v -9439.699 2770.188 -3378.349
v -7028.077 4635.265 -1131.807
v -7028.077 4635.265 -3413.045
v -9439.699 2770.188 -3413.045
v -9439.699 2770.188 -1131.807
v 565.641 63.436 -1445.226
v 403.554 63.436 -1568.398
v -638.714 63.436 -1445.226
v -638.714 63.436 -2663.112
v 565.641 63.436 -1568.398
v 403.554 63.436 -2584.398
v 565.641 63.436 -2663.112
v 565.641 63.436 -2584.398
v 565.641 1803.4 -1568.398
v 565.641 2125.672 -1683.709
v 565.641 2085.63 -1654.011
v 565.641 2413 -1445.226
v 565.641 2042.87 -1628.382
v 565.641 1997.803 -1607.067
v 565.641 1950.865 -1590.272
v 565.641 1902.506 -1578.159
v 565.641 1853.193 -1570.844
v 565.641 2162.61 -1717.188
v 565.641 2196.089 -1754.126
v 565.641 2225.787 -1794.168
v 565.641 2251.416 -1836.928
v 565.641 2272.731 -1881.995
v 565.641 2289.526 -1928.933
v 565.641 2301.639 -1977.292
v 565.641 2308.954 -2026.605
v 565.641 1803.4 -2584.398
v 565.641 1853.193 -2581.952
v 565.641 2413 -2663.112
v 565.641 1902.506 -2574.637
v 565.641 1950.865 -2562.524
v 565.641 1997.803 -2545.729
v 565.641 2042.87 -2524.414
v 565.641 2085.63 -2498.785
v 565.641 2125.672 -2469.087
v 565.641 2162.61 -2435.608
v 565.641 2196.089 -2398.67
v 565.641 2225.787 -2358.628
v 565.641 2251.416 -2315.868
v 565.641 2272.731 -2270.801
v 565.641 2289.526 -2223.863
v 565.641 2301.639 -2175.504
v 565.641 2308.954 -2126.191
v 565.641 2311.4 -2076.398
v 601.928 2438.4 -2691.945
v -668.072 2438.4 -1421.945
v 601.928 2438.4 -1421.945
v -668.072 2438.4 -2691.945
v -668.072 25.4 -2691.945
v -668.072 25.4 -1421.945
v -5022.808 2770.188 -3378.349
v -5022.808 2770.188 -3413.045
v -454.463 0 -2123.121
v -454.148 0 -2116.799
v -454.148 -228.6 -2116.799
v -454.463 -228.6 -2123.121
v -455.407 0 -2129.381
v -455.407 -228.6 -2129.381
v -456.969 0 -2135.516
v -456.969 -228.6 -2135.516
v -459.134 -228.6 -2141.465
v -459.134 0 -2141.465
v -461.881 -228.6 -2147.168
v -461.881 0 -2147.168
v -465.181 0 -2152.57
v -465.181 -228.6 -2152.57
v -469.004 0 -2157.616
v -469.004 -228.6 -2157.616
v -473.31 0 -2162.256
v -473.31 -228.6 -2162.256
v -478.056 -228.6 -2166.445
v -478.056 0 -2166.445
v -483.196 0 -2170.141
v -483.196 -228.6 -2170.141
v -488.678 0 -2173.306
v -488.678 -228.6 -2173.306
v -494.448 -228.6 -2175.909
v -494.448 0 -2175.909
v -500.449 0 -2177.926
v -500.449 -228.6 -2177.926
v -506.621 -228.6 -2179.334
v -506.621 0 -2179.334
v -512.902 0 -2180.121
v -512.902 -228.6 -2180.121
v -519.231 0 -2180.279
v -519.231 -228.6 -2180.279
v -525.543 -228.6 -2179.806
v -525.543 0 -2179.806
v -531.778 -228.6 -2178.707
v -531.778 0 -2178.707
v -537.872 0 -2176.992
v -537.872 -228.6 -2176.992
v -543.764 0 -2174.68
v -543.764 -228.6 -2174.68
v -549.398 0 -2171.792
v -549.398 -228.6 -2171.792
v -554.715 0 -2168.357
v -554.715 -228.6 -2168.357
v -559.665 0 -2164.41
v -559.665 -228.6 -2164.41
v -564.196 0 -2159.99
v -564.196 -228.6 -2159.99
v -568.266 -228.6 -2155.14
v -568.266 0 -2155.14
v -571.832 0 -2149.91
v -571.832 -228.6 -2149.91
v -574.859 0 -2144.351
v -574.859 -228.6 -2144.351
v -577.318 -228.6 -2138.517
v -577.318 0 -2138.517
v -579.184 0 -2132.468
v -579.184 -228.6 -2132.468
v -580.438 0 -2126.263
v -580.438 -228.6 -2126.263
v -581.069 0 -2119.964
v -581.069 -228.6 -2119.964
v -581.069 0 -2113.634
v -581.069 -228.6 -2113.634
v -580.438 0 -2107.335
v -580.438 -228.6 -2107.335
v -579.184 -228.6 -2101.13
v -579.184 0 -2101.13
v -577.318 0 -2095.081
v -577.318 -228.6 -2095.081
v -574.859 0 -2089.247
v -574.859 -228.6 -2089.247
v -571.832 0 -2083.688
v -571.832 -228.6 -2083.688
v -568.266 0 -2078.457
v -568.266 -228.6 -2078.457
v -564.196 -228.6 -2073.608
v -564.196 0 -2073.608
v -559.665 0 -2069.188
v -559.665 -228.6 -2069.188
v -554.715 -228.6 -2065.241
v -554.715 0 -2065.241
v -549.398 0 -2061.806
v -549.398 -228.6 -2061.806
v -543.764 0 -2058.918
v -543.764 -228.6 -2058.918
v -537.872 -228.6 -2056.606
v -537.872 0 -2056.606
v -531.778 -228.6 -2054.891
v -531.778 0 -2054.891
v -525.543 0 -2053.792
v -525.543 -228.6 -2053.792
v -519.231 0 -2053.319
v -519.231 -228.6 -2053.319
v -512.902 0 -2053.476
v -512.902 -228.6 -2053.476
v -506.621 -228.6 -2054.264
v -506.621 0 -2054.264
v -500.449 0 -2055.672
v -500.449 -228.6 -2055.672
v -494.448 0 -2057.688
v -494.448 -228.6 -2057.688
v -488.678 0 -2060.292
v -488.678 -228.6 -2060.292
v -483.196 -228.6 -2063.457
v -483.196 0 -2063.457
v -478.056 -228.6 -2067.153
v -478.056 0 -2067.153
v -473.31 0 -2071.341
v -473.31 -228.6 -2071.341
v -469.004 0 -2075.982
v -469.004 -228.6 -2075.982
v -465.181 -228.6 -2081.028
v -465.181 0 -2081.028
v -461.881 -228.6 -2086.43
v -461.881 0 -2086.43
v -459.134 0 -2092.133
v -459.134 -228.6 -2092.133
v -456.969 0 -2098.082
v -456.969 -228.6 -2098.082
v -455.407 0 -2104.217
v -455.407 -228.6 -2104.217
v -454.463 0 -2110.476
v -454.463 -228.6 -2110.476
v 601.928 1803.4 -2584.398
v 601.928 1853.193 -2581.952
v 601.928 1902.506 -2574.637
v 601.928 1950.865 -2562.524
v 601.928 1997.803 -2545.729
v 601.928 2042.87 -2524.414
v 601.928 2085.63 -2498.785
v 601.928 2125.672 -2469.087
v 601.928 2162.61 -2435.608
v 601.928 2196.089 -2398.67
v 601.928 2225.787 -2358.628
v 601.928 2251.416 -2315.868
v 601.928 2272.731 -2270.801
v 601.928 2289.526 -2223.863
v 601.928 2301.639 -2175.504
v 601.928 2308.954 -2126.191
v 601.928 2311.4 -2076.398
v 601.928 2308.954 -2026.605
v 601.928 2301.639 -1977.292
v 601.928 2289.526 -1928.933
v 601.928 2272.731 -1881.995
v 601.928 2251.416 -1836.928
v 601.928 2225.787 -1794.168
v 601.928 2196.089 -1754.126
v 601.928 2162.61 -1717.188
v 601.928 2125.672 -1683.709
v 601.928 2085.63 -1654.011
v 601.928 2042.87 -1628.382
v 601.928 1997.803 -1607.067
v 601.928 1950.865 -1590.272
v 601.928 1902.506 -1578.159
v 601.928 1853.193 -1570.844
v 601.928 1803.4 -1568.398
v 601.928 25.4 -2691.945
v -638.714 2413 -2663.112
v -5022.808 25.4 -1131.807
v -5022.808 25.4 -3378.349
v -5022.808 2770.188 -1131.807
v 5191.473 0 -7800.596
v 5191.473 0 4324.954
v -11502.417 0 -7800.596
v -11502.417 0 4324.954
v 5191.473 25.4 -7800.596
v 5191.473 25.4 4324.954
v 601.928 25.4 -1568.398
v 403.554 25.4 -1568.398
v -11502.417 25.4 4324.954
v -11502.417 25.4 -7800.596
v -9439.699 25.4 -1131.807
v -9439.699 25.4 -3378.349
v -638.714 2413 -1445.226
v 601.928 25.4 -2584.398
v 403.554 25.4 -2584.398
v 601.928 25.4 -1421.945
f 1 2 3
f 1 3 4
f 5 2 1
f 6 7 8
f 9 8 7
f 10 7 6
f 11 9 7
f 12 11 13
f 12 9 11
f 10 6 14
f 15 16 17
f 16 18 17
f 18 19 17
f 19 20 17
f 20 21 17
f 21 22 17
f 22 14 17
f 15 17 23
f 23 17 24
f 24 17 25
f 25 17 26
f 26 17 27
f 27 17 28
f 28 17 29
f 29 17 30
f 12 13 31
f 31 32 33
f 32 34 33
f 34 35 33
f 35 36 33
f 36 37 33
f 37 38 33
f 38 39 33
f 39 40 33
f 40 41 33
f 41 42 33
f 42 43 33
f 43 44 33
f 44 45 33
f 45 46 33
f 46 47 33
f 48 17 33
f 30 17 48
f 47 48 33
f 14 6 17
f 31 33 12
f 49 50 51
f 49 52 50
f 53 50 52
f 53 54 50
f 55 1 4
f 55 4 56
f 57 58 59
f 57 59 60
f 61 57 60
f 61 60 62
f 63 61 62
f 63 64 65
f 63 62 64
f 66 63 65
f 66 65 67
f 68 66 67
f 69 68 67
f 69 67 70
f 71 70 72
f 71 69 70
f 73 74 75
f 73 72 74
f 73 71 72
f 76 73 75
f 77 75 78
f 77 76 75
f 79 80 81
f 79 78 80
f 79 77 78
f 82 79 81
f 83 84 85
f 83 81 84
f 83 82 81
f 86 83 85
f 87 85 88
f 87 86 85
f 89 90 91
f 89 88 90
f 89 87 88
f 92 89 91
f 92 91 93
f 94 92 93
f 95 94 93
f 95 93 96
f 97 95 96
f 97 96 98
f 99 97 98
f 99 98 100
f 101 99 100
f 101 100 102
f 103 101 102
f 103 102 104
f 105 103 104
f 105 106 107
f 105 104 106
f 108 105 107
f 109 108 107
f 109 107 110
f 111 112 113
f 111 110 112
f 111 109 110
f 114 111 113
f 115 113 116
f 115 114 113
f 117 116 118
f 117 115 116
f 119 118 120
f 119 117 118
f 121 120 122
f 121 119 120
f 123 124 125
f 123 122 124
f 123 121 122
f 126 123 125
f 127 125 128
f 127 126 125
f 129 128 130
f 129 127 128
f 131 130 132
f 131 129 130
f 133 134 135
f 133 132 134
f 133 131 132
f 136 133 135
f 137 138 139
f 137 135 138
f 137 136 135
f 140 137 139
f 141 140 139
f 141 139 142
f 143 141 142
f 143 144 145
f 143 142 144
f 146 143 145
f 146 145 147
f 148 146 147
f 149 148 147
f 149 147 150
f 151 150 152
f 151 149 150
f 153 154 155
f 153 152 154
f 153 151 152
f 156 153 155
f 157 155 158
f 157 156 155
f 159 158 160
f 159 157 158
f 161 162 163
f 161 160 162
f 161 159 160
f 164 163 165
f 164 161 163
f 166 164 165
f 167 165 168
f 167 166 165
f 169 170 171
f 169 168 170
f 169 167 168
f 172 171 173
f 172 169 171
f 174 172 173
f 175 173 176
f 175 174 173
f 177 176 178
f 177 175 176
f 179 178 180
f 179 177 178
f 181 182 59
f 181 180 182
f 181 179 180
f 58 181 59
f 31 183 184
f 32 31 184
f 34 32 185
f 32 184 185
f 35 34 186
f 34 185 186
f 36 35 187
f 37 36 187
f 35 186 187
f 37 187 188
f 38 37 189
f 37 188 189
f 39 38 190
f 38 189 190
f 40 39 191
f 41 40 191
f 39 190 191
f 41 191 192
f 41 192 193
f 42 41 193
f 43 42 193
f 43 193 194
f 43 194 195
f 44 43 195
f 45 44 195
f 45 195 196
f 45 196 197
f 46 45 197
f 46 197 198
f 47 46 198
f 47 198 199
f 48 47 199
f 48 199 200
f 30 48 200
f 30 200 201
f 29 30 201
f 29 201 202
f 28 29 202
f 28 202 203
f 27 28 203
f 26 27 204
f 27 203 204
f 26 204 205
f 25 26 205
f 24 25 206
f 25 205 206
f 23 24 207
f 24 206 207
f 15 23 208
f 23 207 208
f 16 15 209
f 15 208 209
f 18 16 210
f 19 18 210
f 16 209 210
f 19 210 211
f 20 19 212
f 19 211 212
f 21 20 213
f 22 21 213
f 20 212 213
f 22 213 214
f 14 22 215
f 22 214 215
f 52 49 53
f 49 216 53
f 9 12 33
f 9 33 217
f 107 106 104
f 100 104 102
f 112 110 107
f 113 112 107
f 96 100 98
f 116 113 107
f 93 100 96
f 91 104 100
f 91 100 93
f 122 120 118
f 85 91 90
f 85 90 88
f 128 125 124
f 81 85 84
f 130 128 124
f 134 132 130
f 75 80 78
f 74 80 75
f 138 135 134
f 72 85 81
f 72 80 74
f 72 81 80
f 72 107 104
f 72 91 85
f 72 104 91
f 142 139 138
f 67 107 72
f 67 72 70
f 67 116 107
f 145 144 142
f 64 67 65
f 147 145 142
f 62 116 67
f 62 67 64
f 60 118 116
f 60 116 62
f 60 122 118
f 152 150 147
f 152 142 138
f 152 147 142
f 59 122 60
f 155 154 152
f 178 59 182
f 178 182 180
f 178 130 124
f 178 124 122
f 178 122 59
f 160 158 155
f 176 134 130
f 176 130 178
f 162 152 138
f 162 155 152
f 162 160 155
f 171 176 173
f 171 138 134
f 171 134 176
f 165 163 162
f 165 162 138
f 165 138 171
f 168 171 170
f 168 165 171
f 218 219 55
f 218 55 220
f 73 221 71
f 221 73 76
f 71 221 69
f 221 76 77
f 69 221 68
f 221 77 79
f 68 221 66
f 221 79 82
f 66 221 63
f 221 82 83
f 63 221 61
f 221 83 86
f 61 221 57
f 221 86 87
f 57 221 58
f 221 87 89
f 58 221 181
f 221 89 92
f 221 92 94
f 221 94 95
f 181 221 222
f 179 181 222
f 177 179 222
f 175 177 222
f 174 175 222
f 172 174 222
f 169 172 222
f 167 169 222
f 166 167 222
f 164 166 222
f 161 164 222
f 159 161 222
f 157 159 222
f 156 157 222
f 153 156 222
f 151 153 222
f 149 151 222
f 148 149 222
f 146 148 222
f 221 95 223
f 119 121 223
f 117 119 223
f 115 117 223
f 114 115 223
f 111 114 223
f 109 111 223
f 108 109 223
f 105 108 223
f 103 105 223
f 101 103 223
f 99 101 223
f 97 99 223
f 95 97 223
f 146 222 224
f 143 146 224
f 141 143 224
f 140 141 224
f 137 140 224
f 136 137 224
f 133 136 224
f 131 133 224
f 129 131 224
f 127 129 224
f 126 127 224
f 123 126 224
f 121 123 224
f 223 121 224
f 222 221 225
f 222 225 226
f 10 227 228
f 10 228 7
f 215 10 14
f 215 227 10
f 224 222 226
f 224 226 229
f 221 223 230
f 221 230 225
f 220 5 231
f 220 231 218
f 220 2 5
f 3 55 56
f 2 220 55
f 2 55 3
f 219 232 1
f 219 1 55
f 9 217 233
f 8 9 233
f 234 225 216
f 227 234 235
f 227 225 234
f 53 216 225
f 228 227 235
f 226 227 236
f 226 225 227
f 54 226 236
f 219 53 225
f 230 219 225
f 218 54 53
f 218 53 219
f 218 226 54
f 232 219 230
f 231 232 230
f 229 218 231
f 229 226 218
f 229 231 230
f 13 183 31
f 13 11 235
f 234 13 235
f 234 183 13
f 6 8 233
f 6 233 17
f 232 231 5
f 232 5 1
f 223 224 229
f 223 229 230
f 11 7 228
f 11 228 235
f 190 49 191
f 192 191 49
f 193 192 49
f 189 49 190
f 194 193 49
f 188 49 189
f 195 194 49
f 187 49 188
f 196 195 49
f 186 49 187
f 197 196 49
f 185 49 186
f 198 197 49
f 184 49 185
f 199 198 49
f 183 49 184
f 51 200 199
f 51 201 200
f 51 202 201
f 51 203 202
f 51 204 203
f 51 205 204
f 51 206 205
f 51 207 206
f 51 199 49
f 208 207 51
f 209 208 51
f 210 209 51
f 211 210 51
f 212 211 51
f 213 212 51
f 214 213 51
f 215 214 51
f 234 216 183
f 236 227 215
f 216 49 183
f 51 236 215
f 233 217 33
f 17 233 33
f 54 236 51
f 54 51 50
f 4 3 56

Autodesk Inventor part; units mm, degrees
ref_plane "YZ Plane" through (0, 0, 0) normal (1, 0, 0) x (0, 1, 0)
ref_plane "XZ Plane" through (0, 0, 0) normal (0, 1, 0) x (-1, 0, 0)
ref_plane "XY Plane" through (0, 0, 0) normal (0, 0, 1) x (1, 0, 0)
sketch "Sketch1" plane through (0, 0, 0) normal (0, 1, 0) x (-1, 0, 0)
  line L0 (-5191.4732, 4324.9541) -> (11502.4171, 4324.9541)
  line L1 (11502.4171, 4324.9541) -> (11502.4171, -7800.5964)
  line L2 (11502.4171, -7800.5964) -> (-5191.4732, -7800.5964)
  line L3 (-5191.4732, -7800.5964) -> (-5191.4732, 4324.9541)
extrude "Extrusion1" add sketch "Sketch1" along normal blind 25.4
sketch "Sketch2" plane through (0, 0, 0) normal (0, -1, 0) x (1, 0, 0)
  circle A0 centre (-517.6476, -2116.7989) radius 63.5
  point P0 (0, 0)
  dimension "d2" = 127
extrude "Extrusion2" add sketch "Sketch2" along normal blind 228.6
sketch "Sketch3" plane through (0, 0, 0) normal (0, -1, 0) x (1, 0, 0)
  line L0 (-668.0718, -1421.9447) -> (601.9282, -1421.9447)
  line L1 (601.9282, -1421.9447) -> (601.9282, -2691.9447)
  line L2 (601.9282, -2691.9447) -> (-668.0718, -2691.9447)
  line L3 (-668.0718, -2691.9447) -> (-668.0718, -1421.9447)
  point P0 (0, 0)
  dimension "d5" = 1270
  dimension "d6" = 1270
extrude "Extrusion3" add sketch "Sketch3" against normal blind 2413
sketch "Sketch4" plane through (601.9282, 25.4, -2691.9447) normal (1, 0, 0) x (0, 0, -1)
  point P0 (-2691.9447, -25.4)
sketch "Sketch5" plane through (601.9282, 25.4, -2691.9447) normal (1, 0, 0) x (0, 0, -1)
  line L0 (-7016.8988, 0) -> (5108.6517, 0) projected
  line L1 (-107.5467, 0) -> (-1123.5467, 0)
  line L2 (-1123.5467, 0) -> (-1123.5467, 1778)
  line L3 (-107.5467, 1778) -> (-107.5467, 0)
  arc A0 (-107.5467, 1778) -> (-1123.5467, 1778) centre (-615.5467, 1778) ccw
  line L4 (-1123.5467, 0) -> (-107.5467, 0)
  point P0 (-2691.9447, -25.4)
extrude "Extrusion4" cut sketch "Sketch5" against normal blind 198.374
sketch "Sketch7" plane through (0, 2413, 0) normal (0, 1, 0) x (1, 0, 0)
  line L0 (-638.7139, 1445.2256) -> (565.6407, 1445.2256)
  line L1 (565.6407, 1445.2256) -> (565.6407, 2663.1123)
  line L2 (565.6407, 2663.1123) -> (-638.7139, 2663.1123)
  line L3 (-638.7139, 2663.1123) -> (-638.7139, 1445.2256)
  point P0 (0, 0)
extrude "Extrusion5" cut sketch "Sketch7" against normal blind 2349.5635
sketch "Sketch8" plane through (0, 2413, 0) normal (0, 1, 0) x (1, 0, 0)
  line L0 (601.9282, 2691.9447) -> (-668.0718, 2691.9447) projected
  line L1 (601.9282, 1568.398) -> (601.9282, 1421.9447) projected
  line L2 (-668.0718, 2691.9447) -> (601.9282, 2691.9447)
  line L3 (601.9282, 2691.9447) -> (601.9282, 1421.9447)
  line L4 (601.9282, 1421.9447) -> (-668.0718, 1421.9447)
  line L5 (-668.0718, 1421.9447) -> (-668.0718, 2691.9447)
  point P0 (0, 0)
extrude "Extrusion6" add sketch "Sketch8" along normal blind 25.4
sketch "Sketch9" plane through (-11502.4171, 0, -7800.5964) normal (-1, 0, 0) x (0, 0, 1)
  point P0 (7800.5964, 0)
sketch "Sketch10" plane through (0, 25.4, 0) normal (0, 1, 0) x (1, 0, 0)
  line L0 (-5022.8081, 1131.8072) -> (-9439.699, 1131.8072)
  line L1 (-9439.699, 1131.8072) -> (-9439.699, 3378.3486)
  line L2 (-9439.699, 3378.3486) -> (-5022.8081, 3378.3486)
  line L3 (-5022.8081, 3378.3486) -> (-5022.8081, 1131.8072)
  point P0 (0, 0)
extrude "Extrusion7" add sketch "Sketch10" along normal blind 2744.7875
sketch "Sketch11" plane through (-9439.699, 25.4, -1131.8072) normal (0, 0, 1) x (1, 0, 0)
  point P0 (9439.699, -25.4)
sketch "Sketch12" plane through (-9439.699, 25.4, -1131.8072) normal (0, 0, 1) x (1, 0, 0)
  line L0 (0, 0) -> (0, 2744.7875) projected
  line L1 (0, 2744.7875) -> (4416.8909, 2744.7875) projected
  line L2 (0, 2744.7875) -> (4416.8909, 2744.7875)
  line L3 (4416.8909, 2744.7875) -> (2411.6217, 4609.8649)
  line L4 (2411.6217, 4609.8649) -> (0, 2744.7875)
  point P0 (9439.699, -25.4)
extrude "Extrusion8" add sketch "Sketch12" against normal blind 2281.2375
properties part number "mock ground"
